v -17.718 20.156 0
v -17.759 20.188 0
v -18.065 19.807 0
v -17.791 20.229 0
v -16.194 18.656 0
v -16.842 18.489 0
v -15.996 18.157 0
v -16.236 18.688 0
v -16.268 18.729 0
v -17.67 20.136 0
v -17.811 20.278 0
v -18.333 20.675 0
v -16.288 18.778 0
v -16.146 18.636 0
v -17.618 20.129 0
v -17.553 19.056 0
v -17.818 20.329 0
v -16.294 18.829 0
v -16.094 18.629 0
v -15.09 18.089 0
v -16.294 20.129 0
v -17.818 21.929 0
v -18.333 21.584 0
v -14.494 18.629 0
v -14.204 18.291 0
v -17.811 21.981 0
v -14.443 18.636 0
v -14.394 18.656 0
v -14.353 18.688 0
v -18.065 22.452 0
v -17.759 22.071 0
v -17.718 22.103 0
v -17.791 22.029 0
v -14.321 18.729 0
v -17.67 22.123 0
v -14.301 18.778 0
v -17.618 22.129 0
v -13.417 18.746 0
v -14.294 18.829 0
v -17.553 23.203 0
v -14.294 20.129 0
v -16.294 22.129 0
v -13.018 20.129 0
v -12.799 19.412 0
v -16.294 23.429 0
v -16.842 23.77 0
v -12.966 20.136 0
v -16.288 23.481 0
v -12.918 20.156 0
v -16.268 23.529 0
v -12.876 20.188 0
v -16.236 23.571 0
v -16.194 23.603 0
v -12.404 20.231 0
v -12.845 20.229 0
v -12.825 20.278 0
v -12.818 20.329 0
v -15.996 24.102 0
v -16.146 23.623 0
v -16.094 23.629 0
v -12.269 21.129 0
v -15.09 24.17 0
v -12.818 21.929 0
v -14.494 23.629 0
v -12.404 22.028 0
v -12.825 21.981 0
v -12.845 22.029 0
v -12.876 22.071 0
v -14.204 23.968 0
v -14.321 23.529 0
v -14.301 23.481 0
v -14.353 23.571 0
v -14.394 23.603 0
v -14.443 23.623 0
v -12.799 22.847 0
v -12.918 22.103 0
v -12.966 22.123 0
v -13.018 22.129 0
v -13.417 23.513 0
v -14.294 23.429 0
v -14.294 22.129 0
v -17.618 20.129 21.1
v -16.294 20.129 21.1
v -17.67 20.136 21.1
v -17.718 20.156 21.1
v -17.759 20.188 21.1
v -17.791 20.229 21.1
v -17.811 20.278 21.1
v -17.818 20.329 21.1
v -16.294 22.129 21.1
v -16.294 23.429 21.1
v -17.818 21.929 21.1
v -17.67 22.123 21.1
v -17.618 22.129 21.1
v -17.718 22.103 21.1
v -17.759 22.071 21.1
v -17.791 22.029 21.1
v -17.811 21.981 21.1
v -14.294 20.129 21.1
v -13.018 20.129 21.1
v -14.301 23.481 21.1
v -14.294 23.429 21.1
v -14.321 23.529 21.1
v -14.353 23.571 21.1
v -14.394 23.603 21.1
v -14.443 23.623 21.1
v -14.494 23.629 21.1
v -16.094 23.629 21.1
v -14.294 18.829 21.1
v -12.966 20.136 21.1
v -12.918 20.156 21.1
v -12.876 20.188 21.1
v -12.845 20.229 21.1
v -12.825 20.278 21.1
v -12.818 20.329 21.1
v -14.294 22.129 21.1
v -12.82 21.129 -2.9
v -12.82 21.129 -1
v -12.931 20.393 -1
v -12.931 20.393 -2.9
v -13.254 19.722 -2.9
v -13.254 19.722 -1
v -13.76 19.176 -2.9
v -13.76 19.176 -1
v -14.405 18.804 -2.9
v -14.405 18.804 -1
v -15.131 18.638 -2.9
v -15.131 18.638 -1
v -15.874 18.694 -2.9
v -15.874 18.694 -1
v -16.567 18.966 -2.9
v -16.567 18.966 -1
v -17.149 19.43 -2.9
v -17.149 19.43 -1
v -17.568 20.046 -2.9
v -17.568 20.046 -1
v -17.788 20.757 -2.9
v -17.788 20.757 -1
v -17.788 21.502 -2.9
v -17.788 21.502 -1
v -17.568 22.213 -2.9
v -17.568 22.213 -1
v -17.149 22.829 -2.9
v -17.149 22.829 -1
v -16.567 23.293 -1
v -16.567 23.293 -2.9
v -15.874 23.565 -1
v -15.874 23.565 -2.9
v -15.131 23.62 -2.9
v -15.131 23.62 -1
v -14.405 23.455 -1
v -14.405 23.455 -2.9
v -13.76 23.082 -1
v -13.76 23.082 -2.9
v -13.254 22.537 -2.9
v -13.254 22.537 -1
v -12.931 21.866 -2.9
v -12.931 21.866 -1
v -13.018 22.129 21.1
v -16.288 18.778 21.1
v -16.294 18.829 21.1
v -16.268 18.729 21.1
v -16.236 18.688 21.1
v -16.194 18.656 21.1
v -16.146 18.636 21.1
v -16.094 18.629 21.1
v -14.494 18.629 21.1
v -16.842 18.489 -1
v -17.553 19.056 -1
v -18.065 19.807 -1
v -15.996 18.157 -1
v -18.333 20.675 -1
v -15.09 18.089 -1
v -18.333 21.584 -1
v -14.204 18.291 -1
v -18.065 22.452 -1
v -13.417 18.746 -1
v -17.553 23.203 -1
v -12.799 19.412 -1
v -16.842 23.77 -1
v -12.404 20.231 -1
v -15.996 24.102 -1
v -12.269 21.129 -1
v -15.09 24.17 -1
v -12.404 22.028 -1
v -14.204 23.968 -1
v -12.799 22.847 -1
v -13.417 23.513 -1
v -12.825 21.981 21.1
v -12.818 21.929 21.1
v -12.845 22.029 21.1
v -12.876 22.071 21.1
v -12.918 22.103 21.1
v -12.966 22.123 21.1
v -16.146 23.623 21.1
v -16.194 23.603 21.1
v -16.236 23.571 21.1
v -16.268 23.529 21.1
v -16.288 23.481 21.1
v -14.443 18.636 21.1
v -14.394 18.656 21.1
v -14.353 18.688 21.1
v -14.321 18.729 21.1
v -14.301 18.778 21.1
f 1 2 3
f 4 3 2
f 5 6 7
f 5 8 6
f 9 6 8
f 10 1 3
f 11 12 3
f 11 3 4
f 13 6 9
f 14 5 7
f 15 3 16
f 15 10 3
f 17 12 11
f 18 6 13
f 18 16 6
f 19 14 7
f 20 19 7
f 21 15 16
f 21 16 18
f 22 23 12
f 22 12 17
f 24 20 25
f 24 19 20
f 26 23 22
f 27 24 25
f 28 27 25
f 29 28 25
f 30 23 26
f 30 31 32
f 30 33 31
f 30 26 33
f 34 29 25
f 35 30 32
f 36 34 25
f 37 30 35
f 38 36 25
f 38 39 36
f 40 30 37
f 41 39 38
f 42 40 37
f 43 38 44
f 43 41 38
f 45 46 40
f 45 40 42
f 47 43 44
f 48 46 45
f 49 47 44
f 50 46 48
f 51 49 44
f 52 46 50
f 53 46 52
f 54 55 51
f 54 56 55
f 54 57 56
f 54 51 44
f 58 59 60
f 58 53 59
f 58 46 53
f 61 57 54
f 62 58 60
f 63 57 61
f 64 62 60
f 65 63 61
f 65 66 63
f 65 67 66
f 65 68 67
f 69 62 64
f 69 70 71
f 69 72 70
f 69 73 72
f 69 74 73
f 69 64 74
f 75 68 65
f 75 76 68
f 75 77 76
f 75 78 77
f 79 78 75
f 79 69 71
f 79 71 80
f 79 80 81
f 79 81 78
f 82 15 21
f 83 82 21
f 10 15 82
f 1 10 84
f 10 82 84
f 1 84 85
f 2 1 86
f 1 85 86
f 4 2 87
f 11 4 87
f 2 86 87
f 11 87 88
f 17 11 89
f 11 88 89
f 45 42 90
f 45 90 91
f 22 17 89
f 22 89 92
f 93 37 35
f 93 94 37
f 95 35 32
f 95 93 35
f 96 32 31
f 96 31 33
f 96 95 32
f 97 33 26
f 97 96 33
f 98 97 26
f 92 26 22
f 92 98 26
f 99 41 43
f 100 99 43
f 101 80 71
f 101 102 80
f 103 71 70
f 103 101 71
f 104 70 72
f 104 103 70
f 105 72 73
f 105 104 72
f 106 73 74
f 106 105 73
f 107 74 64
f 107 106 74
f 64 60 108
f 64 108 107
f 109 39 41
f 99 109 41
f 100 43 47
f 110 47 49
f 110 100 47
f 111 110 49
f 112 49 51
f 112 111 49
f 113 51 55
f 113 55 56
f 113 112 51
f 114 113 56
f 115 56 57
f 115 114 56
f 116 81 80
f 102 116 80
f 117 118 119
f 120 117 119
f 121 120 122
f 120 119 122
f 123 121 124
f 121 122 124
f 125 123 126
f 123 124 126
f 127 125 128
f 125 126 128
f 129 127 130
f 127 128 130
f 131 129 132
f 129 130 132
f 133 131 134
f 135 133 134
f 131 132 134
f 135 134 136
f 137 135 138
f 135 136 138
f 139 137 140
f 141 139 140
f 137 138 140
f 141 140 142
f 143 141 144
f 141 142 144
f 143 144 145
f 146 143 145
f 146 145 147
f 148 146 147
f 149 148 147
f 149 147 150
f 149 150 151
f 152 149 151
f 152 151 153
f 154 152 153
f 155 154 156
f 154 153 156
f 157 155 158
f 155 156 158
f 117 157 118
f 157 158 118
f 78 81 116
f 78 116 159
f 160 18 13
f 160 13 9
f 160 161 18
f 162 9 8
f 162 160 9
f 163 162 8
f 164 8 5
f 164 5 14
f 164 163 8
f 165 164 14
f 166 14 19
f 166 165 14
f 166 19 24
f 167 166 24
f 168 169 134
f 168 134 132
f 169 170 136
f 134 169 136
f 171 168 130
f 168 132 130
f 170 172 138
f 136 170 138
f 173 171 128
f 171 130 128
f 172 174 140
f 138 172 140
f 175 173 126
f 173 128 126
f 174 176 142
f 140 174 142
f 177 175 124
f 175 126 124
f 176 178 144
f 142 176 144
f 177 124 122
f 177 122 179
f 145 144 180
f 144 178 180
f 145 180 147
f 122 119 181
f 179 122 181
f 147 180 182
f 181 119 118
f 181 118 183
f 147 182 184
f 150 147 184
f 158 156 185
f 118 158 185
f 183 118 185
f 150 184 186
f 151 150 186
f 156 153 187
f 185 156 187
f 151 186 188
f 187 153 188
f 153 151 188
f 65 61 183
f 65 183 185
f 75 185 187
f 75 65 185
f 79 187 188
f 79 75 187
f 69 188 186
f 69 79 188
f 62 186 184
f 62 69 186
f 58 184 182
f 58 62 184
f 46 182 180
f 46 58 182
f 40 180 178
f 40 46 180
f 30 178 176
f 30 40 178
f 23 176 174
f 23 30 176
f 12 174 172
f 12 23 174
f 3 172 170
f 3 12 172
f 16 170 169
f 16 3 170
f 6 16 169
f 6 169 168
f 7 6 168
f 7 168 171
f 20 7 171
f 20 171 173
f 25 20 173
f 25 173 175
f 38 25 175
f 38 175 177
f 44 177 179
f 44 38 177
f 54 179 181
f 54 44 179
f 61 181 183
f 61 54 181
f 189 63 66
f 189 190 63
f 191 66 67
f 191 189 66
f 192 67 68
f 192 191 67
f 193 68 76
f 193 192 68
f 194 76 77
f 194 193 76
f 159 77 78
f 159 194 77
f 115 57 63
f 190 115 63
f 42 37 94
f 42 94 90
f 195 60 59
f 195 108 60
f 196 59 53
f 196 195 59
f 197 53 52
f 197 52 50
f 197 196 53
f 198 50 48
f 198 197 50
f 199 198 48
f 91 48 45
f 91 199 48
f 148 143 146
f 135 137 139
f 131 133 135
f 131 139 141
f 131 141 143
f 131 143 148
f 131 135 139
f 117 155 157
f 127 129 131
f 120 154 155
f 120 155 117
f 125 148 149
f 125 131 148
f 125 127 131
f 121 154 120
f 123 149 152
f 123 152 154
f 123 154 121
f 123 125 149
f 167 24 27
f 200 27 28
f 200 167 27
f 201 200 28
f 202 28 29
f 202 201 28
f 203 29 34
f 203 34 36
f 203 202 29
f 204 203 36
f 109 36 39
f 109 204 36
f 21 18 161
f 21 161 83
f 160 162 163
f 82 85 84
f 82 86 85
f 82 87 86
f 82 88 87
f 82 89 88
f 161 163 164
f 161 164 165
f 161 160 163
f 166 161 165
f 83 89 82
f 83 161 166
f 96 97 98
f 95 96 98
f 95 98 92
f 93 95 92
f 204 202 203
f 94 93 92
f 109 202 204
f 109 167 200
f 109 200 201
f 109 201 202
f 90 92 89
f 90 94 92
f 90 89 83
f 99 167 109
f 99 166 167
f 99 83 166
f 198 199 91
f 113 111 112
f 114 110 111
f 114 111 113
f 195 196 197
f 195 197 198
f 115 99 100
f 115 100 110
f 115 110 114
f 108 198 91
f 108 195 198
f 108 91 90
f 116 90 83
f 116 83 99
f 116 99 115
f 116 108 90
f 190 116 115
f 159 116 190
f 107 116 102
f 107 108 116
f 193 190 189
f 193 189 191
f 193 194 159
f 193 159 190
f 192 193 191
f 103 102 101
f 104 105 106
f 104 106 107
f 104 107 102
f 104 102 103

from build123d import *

# Parameters (mm, degrees)
F0_W     = 1.5233159065
F0_H     = 2
F0_W_2   = 2
F0_H_2   = 1.5
F0_W_3   = 1.4766840935
F1_DEPTH = 21.1
F2_R     = 3.0488114631
F3_DEPTH = 1
F4_R     = 2.4979644643
F5_DEPTH = 1.9
F6_R     = 0.2


with BuildPart() as f1:
    # F0 (on Top) → F1 (new body)
    with BuildSketch(Plane.XY):
        with Locations((-17.0561056584, 21.1294589788)):
            Rectangle(F0_W, F0_H)
        with Locations((-15.2944477051, 22.8794589788)):
            Rectangle(F0_W_2, F0_H_2)
        with Locations((-15.2944477051, 21.1294589788)):
            Rectangle(F0_W_2, F0_H)
        with Locations((-13.5561056584, 21.1294589788)):
            Rectangle(F0_W_3, F0_H)
        with Locations((-15.2944477051, 19.3794589788)):
            Rectangle(F0_W_2, F0_H_2)
    extrude(amount=F1_DEPTH)

    # F2 (on Top) → F3 (join)
    with BuildSketch(Plane.XY):
        with Locations((-15.3177636117, 21.1294589788)):
            Circle(F2_R)
    extrude(amount=-F3_DEPTH)

    # F4 (on face) → F5 (join)
    with BuildSketch(Plane(origin=(0, 0, -1), x_dir=(1, 0, 0), z_dir=(0, 0, -1))):
        with Locations((-15.3177636117, -21.1294589788)):
            Circle(F4_R)
    extrude(amount=F5_DEPTH)

    # F6
    f6_edges = [f1.edges().sort_by_distance(p)[0] for p in [
        (-12.817764, 20.129459, 10.55),
        (-12.817764, 22.129459, 10.55),
        (-14.294448, 18.629459, 10.55),
        (-16.294448, 18.629459, 10.55),
        (-17.817764, 20.129459, 10.55),
        (-17.817764, 22.129459, 10.55),
        (-16.294448, 23.629459, 10.55),
        (-14.294448, 23.629459, 10.55),
    ]]
    fillet(f6_edges, radius=F6_R)


solid = f1.part
